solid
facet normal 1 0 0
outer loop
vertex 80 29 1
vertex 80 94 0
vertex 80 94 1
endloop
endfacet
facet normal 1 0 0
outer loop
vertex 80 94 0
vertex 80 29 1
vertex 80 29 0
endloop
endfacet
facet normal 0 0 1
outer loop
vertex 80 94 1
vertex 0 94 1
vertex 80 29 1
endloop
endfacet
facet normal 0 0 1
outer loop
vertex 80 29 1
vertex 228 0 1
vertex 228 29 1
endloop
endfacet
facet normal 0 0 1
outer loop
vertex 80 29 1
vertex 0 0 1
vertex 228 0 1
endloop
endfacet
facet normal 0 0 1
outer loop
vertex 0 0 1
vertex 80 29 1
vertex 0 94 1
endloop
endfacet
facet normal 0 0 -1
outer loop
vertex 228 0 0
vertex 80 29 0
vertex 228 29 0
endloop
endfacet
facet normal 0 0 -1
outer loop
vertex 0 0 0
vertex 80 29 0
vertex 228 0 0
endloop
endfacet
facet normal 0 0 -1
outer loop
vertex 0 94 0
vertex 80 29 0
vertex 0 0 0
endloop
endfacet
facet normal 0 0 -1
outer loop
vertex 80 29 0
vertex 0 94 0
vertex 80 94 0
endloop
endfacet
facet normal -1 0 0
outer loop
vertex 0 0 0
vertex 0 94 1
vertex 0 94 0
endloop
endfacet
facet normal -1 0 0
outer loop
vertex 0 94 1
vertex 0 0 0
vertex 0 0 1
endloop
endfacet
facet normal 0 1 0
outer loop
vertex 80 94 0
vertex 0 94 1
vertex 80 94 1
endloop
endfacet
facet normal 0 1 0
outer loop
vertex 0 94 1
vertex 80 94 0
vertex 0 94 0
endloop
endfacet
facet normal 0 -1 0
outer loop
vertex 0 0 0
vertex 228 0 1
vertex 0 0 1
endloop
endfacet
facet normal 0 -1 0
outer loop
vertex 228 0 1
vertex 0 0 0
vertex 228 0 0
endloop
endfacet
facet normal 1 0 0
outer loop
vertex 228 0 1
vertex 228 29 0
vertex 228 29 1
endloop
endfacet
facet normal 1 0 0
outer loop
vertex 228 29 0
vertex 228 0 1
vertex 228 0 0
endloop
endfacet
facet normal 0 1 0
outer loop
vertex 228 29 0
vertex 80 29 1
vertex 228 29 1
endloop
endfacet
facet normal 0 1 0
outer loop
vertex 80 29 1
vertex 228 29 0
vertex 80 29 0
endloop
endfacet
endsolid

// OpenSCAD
largeLength = 80;
largewidth = 94;
smallLength = 148;
smallWidth = 29;
height = 1;


cube([largeLength,largewidth, height]);
translate([largeLength,0,0]) cube([smallLength, smallWidth, height]);
